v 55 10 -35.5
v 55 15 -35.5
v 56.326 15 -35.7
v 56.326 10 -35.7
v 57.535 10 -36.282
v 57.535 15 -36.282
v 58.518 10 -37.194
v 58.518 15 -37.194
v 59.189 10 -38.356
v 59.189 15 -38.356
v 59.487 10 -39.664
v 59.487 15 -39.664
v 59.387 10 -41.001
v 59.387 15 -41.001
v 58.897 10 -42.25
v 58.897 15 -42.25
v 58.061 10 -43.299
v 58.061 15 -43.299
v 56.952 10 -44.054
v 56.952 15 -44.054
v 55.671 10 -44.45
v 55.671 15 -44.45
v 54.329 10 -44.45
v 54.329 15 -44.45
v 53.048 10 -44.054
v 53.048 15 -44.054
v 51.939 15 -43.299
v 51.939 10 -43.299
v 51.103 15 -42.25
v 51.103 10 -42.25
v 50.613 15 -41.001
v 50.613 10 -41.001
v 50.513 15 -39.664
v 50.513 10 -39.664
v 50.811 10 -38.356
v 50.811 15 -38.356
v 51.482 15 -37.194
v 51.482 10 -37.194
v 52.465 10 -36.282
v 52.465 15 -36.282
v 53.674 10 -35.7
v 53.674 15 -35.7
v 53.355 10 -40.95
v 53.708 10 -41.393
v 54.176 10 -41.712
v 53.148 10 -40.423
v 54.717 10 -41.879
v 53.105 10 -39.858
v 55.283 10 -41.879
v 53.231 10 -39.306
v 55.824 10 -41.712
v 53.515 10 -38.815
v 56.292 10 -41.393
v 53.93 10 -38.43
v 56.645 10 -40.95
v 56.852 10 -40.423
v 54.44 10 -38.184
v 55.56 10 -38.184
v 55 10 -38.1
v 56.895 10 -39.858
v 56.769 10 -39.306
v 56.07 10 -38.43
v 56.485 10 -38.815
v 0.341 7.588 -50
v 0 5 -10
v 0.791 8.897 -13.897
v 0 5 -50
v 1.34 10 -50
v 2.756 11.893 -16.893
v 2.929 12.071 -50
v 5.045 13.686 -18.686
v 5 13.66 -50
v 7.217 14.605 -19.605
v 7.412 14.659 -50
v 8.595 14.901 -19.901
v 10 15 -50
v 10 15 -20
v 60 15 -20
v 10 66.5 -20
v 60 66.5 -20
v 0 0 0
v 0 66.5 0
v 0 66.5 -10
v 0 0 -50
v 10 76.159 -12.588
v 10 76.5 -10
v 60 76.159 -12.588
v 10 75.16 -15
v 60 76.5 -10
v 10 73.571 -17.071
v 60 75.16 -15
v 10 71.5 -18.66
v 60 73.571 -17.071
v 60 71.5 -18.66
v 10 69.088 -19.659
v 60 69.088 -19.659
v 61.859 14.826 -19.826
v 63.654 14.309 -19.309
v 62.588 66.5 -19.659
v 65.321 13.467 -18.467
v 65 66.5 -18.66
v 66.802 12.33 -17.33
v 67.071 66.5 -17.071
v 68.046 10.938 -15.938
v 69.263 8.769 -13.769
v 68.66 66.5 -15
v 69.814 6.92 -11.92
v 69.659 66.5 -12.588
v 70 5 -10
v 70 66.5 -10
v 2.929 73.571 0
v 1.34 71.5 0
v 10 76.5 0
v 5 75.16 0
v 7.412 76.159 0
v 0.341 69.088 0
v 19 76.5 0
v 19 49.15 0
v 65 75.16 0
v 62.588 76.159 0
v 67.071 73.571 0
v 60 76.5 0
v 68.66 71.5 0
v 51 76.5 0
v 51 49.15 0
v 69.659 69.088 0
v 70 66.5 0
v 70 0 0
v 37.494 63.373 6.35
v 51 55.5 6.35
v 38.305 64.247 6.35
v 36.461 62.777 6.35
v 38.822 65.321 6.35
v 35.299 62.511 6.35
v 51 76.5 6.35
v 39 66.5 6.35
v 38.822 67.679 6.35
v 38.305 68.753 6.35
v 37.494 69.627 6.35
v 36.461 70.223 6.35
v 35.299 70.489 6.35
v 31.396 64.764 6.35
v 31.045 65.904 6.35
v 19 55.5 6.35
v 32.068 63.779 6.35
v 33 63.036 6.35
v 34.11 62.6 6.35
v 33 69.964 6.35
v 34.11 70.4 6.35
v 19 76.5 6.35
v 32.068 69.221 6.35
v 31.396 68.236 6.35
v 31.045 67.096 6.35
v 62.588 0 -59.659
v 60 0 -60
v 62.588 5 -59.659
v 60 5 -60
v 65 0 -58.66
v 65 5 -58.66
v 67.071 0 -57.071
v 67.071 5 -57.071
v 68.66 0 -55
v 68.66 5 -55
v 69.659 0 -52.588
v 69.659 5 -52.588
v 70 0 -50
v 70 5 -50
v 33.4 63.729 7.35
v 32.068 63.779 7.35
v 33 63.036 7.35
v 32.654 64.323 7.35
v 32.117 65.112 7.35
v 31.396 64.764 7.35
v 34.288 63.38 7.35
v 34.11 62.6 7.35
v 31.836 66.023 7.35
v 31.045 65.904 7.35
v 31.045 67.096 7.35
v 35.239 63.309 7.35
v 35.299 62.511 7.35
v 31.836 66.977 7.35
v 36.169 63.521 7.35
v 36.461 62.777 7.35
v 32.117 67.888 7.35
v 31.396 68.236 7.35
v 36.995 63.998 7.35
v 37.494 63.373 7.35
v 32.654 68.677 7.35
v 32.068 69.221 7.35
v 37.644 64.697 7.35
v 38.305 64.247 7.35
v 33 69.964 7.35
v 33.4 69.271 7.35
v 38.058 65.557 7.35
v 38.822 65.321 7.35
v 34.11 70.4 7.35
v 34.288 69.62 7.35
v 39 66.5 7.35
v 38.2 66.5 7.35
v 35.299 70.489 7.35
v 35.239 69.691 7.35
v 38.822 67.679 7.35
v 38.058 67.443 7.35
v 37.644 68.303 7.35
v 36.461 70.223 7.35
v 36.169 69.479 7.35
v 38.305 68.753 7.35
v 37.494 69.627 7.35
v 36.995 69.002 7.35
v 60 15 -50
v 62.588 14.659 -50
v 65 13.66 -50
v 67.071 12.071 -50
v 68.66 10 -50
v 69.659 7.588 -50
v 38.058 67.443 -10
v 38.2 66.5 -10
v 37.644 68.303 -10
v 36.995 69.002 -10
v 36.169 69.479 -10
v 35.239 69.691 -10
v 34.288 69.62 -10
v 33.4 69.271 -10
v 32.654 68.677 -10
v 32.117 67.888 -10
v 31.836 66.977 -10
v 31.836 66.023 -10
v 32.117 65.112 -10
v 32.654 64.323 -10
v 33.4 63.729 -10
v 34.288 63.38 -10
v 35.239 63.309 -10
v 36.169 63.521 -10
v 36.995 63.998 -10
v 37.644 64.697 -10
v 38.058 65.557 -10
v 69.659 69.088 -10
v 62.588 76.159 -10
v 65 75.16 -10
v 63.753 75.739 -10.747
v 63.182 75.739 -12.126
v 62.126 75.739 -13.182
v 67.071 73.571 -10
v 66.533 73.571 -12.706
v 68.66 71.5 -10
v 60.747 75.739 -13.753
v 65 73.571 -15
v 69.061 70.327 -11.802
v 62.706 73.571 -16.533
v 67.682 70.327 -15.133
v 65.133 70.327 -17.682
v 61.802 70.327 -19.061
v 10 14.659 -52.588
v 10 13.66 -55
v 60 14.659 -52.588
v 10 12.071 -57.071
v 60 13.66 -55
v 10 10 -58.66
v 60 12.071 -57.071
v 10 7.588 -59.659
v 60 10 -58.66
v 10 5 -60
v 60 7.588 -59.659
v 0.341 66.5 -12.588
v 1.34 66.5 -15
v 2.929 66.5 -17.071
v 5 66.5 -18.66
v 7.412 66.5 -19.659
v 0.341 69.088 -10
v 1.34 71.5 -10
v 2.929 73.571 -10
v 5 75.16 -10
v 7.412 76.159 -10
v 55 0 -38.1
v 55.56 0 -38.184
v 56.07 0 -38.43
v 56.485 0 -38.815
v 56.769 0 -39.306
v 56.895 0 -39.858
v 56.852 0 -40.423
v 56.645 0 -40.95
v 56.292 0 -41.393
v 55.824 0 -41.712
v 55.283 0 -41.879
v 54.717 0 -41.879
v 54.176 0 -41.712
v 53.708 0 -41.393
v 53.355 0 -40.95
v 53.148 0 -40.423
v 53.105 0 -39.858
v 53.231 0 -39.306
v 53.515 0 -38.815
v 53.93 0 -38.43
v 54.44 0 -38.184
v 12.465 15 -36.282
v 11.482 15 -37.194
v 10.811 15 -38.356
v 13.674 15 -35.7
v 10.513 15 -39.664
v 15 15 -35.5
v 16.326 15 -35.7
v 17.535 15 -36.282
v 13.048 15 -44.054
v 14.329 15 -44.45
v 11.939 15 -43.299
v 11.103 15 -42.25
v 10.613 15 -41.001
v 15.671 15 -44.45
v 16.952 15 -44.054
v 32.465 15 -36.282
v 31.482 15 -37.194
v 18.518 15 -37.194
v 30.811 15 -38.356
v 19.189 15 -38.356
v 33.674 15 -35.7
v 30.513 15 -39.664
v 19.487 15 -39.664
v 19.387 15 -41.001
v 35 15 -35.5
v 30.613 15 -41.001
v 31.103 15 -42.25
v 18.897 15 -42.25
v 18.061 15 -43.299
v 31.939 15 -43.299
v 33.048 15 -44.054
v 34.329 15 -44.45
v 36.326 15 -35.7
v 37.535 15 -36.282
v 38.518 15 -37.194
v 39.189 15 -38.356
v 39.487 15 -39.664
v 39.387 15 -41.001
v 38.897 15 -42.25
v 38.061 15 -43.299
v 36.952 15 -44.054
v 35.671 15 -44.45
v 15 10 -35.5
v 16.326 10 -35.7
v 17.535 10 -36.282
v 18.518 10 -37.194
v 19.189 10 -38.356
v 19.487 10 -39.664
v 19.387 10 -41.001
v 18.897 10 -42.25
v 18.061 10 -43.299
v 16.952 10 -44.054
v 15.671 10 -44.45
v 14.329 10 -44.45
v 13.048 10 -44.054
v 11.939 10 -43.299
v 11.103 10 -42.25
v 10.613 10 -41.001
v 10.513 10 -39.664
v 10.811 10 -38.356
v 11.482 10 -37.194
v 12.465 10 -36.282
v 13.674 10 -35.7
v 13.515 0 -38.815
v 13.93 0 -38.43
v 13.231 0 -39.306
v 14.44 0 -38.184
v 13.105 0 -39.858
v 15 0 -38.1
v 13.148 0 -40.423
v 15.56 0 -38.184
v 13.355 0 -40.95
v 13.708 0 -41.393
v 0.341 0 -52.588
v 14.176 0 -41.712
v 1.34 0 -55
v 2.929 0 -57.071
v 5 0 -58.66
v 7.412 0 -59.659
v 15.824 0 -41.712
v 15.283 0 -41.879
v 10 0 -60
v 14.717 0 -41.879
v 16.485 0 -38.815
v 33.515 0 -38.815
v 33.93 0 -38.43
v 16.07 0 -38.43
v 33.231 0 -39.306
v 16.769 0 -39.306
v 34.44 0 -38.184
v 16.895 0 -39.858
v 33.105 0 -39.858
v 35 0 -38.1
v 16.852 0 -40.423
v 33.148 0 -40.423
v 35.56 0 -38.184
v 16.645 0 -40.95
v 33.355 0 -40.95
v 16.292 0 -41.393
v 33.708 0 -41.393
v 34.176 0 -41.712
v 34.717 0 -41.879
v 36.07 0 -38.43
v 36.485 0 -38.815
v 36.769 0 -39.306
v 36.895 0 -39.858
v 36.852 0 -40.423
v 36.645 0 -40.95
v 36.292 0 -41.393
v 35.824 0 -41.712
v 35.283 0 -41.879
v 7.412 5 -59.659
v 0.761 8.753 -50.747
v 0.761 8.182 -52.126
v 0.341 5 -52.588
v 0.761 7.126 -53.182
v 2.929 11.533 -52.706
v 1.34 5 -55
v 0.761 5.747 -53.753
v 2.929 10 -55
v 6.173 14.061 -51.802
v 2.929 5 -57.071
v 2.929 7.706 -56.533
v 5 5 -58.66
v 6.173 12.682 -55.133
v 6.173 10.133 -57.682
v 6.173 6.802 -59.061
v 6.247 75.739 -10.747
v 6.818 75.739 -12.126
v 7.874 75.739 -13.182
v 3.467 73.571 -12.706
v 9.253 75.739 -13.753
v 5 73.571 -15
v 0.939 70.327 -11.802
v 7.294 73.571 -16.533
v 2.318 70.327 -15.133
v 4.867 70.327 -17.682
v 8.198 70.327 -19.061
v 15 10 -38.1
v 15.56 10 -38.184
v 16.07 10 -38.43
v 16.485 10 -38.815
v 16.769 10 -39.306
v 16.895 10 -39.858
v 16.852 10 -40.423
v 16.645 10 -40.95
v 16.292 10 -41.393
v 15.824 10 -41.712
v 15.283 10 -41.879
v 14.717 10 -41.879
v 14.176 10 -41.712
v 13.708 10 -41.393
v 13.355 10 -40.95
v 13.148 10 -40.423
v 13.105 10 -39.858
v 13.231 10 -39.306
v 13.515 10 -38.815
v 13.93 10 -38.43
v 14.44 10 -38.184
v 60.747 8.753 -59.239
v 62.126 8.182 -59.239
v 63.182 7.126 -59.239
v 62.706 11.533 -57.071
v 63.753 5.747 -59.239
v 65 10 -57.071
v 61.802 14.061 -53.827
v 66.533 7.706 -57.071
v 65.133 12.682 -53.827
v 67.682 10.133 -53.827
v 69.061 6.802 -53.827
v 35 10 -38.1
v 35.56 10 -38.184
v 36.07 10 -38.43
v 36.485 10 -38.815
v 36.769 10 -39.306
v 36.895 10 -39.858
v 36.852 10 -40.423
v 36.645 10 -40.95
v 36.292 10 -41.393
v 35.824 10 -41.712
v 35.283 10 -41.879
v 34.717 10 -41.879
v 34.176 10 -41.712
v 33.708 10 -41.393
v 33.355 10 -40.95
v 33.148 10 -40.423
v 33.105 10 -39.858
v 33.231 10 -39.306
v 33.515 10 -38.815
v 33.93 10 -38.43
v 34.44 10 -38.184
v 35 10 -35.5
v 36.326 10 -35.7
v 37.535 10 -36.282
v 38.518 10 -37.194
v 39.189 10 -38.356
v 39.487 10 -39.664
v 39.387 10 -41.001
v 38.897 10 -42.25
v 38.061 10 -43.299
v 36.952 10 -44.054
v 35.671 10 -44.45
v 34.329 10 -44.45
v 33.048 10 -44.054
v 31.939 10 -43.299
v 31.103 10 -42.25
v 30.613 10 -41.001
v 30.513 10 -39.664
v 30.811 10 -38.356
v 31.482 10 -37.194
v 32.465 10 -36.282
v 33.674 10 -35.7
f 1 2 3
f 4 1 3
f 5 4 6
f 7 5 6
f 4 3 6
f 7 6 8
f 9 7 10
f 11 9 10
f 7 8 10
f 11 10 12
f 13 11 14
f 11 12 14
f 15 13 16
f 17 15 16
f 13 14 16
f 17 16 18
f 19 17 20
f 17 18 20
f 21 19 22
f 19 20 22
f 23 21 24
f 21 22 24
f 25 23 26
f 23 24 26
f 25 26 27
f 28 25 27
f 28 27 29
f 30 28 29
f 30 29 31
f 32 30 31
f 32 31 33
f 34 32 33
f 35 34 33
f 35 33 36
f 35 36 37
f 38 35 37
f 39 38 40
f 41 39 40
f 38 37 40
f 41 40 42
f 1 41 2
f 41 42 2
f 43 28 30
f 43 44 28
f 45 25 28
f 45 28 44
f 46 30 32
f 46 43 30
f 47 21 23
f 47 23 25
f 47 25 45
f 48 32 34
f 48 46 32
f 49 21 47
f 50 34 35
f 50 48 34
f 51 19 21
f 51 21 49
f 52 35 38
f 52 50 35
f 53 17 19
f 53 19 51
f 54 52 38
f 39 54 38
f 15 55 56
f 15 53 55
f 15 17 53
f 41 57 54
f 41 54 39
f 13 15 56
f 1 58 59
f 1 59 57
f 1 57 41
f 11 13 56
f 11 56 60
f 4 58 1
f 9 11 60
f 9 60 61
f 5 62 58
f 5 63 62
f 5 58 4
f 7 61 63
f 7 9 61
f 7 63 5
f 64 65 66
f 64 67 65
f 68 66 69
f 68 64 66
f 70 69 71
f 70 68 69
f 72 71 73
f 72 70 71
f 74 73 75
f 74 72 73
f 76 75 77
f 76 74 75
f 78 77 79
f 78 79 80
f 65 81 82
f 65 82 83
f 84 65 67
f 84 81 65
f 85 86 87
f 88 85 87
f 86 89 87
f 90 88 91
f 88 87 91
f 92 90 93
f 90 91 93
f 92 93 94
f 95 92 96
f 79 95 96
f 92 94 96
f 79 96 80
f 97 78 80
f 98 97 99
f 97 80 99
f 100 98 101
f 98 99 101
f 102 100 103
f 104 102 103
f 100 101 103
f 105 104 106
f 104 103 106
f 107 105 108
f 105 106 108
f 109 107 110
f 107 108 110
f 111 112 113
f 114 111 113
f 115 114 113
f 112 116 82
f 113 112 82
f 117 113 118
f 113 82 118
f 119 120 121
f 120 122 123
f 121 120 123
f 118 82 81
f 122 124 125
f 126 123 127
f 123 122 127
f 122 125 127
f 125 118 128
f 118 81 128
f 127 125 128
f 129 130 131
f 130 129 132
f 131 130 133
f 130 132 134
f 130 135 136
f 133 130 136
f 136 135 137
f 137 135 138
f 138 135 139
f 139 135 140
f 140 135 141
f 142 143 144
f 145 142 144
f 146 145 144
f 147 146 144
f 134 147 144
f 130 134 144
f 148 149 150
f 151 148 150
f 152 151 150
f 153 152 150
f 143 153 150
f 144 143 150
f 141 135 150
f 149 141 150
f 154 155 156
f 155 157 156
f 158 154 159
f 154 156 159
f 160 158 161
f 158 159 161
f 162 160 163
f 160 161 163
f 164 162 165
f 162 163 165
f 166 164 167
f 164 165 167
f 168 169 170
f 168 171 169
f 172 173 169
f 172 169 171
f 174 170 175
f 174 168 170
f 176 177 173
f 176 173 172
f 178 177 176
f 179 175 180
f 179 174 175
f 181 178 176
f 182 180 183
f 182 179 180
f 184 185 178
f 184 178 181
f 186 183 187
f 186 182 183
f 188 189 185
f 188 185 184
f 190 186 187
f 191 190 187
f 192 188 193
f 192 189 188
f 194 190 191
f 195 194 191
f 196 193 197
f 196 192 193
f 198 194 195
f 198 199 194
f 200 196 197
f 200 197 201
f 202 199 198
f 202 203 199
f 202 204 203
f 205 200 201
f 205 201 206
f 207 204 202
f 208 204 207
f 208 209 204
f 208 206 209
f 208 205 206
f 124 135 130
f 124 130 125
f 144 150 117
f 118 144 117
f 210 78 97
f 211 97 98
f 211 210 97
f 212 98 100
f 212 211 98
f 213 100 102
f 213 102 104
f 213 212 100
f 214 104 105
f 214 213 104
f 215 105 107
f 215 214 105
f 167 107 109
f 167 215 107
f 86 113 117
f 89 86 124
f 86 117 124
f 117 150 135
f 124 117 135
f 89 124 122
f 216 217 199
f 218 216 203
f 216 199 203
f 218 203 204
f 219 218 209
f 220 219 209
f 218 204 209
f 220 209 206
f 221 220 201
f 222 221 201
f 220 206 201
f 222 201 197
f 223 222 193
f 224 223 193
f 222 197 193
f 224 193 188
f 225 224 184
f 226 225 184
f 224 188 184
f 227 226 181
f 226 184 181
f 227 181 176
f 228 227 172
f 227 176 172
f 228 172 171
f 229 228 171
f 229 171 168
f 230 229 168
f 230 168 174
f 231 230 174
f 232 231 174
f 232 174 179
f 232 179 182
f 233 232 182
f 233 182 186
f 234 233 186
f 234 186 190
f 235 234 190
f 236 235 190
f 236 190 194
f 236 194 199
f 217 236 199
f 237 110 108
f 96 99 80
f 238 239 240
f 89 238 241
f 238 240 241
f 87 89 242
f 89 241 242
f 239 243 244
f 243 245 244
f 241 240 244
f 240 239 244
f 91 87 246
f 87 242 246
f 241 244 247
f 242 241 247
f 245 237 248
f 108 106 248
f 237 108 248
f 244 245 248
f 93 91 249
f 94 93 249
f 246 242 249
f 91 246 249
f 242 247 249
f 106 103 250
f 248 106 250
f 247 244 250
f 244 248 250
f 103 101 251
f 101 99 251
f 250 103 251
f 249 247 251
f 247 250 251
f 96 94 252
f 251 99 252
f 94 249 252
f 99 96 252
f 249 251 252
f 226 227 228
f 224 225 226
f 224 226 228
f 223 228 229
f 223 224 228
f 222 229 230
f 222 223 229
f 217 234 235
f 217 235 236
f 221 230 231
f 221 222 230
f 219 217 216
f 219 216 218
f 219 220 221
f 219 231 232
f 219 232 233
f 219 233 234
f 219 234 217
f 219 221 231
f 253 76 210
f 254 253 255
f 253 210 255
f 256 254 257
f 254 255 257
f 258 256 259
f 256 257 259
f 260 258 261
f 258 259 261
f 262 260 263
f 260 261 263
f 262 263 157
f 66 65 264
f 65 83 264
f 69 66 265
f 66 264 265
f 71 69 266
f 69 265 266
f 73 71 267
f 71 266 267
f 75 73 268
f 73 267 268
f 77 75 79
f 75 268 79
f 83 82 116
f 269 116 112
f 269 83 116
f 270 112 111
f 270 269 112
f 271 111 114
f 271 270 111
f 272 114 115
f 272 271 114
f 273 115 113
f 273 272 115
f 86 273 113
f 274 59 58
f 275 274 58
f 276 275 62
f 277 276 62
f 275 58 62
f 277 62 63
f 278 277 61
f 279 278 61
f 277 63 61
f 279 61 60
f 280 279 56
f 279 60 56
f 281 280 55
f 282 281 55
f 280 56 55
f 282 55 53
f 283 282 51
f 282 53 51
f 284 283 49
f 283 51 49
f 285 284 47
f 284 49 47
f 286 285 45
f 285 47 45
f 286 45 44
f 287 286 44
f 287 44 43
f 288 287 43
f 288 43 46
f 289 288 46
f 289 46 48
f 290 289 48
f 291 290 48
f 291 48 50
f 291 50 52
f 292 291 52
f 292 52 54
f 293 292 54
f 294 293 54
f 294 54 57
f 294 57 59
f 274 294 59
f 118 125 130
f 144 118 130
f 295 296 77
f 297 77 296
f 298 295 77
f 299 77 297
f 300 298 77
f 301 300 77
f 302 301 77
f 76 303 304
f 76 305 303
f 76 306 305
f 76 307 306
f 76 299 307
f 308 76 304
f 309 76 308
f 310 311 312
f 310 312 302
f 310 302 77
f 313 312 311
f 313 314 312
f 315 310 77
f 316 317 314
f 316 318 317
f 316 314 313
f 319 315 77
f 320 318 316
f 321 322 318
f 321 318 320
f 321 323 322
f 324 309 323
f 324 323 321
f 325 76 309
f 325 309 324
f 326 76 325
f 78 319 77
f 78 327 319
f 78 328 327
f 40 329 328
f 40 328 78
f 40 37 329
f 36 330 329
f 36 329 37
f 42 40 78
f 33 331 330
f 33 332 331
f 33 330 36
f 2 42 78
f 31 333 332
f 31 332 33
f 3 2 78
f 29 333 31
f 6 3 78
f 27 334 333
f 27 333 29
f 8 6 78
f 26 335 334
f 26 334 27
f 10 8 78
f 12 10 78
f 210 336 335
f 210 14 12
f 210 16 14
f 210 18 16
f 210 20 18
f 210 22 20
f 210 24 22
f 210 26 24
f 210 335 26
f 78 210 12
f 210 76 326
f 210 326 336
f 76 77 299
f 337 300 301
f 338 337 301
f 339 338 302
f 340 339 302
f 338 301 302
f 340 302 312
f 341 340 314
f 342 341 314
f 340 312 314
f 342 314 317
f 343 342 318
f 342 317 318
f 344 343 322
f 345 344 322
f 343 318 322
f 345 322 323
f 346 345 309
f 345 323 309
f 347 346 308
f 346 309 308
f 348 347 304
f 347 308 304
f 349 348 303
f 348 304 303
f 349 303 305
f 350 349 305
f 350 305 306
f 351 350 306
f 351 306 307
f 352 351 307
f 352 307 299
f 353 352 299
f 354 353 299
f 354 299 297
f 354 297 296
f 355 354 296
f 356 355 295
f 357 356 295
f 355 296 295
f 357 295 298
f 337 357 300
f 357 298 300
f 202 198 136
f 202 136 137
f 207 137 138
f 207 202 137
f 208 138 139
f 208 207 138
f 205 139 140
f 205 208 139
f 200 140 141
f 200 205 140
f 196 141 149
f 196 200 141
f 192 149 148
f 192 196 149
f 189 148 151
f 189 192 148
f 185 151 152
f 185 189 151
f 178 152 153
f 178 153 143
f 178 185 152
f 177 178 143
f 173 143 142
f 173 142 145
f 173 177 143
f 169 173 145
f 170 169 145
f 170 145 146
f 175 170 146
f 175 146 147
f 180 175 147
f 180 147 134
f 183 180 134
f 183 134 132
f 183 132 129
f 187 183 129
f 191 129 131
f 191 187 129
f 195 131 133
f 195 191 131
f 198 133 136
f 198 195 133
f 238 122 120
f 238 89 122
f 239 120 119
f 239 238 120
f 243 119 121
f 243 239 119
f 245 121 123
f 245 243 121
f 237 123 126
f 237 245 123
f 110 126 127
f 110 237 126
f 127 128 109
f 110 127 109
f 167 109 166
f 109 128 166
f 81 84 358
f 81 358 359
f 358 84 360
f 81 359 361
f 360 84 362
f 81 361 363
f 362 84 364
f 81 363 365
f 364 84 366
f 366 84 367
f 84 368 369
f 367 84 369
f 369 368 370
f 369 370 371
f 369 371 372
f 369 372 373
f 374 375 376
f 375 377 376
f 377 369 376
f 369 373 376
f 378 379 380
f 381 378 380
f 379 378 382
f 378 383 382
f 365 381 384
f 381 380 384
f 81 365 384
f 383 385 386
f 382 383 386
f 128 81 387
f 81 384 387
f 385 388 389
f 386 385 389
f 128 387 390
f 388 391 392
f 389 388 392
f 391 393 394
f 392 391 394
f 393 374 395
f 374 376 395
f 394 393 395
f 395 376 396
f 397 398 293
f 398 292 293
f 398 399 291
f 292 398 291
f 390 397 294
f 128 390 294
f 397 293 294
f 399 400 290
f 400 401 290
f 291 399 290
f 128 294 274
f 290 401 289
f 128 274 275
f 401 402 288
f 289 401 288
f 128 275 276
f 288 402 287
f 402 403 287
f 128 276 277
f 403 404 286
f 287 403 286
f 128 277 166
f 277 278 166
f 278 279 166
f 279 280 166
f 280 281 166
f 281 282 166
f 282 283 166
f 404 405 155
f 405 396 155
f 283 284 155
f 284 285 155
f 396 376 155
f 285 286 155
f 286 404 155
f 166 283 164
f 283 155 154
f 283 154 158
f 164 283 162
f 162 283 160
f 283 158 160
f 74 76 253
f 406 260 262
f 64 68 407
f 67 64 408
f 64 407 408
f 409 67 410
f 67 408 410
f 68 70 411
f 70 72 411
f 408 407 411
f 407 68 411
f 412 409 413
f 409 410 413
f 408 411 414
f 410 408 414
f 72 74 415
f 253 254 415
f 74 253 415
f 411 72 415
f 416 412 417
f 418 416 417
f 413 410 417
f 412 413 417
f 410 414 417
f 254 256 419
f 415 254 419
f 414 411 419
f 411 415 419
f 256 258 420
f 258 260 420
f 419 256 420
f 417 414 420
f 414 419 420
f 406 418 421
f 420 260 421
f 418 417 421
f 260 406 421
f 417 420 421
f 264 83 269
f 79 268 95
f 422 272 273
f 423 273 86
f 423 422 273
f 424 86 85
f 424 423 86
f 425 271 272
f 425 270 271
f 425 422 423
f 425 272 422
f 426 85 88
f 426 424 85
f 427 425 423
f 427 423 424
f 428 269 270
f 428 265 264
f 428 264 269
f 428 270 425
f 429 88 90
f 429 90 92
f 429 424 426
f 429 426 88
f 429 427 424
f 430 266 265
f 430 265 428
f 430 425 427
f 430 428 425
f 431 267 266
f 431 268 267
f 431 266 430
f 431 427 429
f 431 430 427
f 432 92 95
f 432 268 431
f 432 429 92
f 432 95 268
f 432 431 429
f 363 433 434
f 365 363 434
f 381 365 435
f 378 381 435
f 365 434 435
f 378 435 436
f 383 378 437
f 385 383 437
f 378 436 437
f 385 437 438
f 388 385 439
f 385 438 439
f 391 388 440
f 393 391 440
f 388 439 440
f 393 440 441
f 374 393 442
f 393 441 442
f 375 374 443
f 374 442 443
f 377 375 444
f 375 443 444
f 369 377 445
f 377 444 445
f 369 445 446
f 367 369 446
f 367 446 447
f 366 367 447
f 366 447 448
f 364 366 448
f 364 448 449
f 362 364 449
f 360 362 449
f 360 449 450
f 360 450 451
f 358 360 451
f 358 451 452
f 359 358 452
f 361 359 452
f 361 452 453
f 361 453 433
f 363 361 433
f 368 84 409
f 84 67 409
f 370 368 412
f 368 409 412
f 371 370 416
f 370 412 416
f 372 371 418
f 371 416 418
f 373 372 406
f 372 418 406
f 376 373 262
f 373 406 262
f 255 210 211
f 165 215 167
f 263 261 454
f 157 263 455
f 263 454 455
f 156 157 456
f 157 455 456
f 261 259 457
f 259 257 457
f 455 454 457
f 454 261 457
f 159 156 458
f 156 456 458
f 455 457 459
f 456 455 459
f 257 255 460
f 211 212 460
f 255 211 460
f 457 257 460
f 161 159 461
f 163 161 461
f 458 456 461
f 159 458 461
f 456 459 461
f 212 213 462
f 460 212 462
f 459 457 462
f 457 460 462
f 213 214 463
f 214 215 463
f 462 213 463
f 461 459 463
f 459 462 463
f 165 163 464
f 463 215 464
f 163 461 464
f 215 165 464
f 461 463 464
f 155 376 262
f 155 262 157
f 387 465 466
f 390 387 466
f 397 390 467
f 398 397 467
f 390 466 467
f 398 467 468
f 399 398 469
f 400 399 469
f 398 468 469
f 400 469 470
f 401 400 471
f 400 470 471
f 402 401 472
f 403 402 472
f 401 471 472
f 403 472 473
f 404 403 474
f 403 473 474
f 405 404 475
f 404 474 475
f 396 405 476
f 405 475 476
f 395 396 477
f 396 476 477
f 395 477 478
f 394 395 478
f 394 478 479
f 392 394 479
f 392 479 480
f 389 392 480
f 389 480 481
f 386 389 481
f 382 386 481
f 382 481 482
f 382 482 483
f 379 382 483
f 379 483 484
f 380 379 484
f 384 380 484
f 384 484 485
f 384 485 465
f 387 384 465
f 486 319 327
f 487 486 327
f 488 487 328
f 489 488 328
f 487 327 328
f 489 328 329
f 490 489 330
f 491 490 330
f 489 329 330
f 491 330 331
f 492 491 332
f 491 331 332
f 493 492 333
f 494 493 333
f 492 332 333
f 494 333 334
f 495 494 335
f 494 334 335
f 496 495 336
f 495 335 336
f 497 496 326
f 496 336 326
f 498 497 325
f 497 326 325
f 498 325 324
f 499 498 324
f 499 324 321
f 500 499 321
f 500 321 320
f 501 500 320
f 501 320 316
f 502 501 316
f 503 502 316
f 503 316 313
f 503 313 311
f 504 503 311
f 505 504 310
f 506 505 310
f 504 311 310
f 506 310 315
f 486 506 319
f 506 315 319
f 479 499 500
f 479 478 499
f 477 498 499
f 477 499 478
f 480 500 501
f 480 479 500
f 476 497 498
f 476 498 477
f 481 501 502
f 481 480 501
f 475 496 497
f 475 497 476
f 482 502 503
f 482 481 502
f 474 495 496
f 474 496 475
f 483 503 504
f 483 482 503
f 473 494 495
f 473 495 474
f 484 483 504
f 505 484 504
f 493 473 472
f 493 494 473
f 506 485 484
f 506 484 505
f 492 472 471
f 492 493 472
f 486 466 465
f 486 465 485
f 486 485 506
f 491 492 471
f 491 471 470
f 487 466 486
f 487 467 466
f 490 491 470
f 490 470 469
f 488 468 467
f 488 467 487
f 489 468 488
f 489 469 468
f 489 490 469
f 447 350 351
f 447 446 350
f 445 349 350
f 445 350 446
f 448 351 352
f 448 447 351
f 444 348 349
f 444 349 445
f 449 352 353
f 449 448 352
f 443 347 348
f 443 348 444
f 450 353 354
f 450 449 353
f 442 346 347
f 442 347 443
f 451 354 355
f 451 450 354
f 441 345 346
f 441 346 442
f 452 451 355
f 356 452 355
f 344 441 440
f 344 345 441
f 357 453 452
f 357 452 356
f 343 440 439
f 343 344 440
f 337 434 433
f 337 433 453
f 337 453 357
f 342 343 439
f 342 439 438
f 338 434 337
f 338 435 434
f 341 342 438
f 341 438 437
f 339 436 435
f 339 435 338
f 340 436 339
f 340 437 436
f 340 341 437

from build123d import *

# Parameters (mm, degrees)
SKETCH1_W           = 70
SKETCH1_H           = 60
BOSS_EXTRUDE1_DEPTH = 15
SKETCH2_W           = 70
SKETCH2_H           = 20
BOSS_EXTRUDE2_DEPTH = 61.5
SKETCH3_R           = 3.2
CUT_EXTRUDE1_DEPTH  = 10
SKETCH5_R           = 1.9
CUT_EXTRUDE2_DEPTH  = 111.825312993
SKETCH6_R           = 4.5
CUT_EXTRUDE3_DEPTH  = 5
FILLET1_R           = 10
BOSS_EXTRUDE3_START = 6.35
SKETCH7_W           = 32
SKETCH7_H           = 20
SKETCH7_R           = 3.2
BOSS_EXTRUDE3_DEPTH = 6.35
CHAMFER1_SIZE       = 7.35
BOSS_EXTRUDE4_START = 1
SKETCH8_R           = 4
SKETCH8_R_2         = 3.2
BOSS_EXTRUDE4_DEPTH = 1


with BuildPart() as part:
    # Sketch1 → Boss-Extrude1 (new body)
    with BuildSketch(Plane(origin=(0, 0, 0), x_dir=(1, 0, 0), z_dir=(0, 1, 0))):
        with Locations((35, 30)):
            Rectangle(SKETCH1_W, SKETCH1_H)
    extrude(amount=BOSS_EXTRUDE1_DEPTH)

    # Sketch2 → Boss-Extrude2 (add)
    with BuildSketch(Plane(origin=(0, 15, 0), x_dir=(1, 0, 0), z_dir=(0, 1, 0))):
        with Locations((35, 10)):
            Rectangle(SKETCH2_W, SKETCH2_H)
    extrude(amount=BOSS_EXTRUDE2_DEPTH)

    # Sketch3 → Cut-Extrude1 (cut)
    with BuildSketch(Plane.XY):
        with Locations((35, 66.5)):
            Circle(SKETCH3_R)
    extrude(amount=-CUT_EXTRUDE1_DEPTH, mode=Mode.SUBTRACT)

    # Sketch5 → Cut-Extrude2 (cut, through all)
    with BuildSketch(Plane(origin=(0, 15, 0), x_dir=(1, 0, 0), z_dir=(0, 1, 0))):
        with Locations(Location((15, 40, 0), (0, 0, 270))):
            Circle(SKETCH5_R)
        with Locations(Location((35, 40, 0), (0, 0, 270))):
            Circle(SKETCH5_R)
        with Locations(Location((55, 40, 0), (0, 0, 270))):
            Circle(SKETCH5_R)
    extrude(amount=-CUT_EXTRUDE2_DEPTH, mode=Mode.SUBTRACT)

    # Sketch6 → Cut-Extrude3 (cut)
    with BuildSketch(Plane(origin=(0, 15, 0), x_dir=(1, 0, 0), z_dir=(0, 1, 0))):
        with Locations(Location((15, 40, 0), (0, 0, 270))):
            Circle(SKETCH6_R)
        with Locations(Location((35, 40, 0), (0, 0, 270))):
            Circle(SKETCH6_R)
        with Locations(Location((55, 40, 0), (0, 0, 270))):
            Circle(SKETCH6_R)
    extrude(amount=-CUT_EXTRUDE3_DEPTH, mode=Mode.SUBTRACT)

    # Fillet1
    fillet1_edges = [part.edges().sort_by_distance(p)[0] for p in [
        (70, 15, -40),
        (0, 45.75, -20),
        (35, 15, -60),
        (70, 45.75, -20),
        (0, 76.5, -10),
        (70, 76.5, -10),
        (35, 76.5, -20),
        (0, 15, -40),
        (0, 7.5, -60),
        (70, 7.5, -60),
    ]]
    fillet(fillet1_edges, radius=FILLET1_R)

    # Sketch7 → Boss-Extrude3 (add)
    with BuildSketch(Plane.XY.offset(BOSS_EXTRUDE3_START)):
        with Locations((35, 66.5)):
            Rectangle(SKETCH7_W, SKETCH7_H)
        with Locations((35, 66.5)):
            Circle(SKETCH7_R, mode=Mode.SUBTRACT)
    extrude(amount=-BOSS_EXTRUDE3_DEPTH)

    # Chamfer1
    # the kernel refuses this chamfer: 7.35 mm, written as the material it adds along each edge
    with BuildSketch(Plane(origin=(51, 56.5, 0), x_dir=(0, -0.9996219169112966, -0.027495876610586365), z_dir=(-1, 0, 0))) as chamfer1_piece_1_section:
        Polygon((CHAMFER1_SIZE * 0.999621916911, CHAMFER1_SIZE * 0.0274958766106), (-CHAMFER1_SIZE * 0.0274958766106, CHAMFER1_SIZE * 0.999621916911), (0, 0), align=None)
    chamfer1_piece_1 = extrude(amount=32, mode=Mode.PRIVATE)
    chamfer1_piece_1 = split(chamfer1_piece_1, bisect_by=Plane(origin=(35, 54.008386108, 6.35), z_dir=(0, 0, -1)), keep=Keep.TOP, mode=Mode.PRIVATE)
    add(chamfer1_piece_1)

    # Sketch8 → Boss-Extrude4 (add)
    with BuildSketch(Plane.XY.offset(6.35).offset(BOSS_EXTRUDE4_START)):
        with Locations((35, 66.5)):
            Circle(SKETCH8_R)
        with Locations((35, 66.5)):
            Circle(SKETCH8_R_2, mode=Mode.SUBTRACT)
    extrude(amount=-BOSS_EXTRUDE4_DEPTH)


solid = part.part
